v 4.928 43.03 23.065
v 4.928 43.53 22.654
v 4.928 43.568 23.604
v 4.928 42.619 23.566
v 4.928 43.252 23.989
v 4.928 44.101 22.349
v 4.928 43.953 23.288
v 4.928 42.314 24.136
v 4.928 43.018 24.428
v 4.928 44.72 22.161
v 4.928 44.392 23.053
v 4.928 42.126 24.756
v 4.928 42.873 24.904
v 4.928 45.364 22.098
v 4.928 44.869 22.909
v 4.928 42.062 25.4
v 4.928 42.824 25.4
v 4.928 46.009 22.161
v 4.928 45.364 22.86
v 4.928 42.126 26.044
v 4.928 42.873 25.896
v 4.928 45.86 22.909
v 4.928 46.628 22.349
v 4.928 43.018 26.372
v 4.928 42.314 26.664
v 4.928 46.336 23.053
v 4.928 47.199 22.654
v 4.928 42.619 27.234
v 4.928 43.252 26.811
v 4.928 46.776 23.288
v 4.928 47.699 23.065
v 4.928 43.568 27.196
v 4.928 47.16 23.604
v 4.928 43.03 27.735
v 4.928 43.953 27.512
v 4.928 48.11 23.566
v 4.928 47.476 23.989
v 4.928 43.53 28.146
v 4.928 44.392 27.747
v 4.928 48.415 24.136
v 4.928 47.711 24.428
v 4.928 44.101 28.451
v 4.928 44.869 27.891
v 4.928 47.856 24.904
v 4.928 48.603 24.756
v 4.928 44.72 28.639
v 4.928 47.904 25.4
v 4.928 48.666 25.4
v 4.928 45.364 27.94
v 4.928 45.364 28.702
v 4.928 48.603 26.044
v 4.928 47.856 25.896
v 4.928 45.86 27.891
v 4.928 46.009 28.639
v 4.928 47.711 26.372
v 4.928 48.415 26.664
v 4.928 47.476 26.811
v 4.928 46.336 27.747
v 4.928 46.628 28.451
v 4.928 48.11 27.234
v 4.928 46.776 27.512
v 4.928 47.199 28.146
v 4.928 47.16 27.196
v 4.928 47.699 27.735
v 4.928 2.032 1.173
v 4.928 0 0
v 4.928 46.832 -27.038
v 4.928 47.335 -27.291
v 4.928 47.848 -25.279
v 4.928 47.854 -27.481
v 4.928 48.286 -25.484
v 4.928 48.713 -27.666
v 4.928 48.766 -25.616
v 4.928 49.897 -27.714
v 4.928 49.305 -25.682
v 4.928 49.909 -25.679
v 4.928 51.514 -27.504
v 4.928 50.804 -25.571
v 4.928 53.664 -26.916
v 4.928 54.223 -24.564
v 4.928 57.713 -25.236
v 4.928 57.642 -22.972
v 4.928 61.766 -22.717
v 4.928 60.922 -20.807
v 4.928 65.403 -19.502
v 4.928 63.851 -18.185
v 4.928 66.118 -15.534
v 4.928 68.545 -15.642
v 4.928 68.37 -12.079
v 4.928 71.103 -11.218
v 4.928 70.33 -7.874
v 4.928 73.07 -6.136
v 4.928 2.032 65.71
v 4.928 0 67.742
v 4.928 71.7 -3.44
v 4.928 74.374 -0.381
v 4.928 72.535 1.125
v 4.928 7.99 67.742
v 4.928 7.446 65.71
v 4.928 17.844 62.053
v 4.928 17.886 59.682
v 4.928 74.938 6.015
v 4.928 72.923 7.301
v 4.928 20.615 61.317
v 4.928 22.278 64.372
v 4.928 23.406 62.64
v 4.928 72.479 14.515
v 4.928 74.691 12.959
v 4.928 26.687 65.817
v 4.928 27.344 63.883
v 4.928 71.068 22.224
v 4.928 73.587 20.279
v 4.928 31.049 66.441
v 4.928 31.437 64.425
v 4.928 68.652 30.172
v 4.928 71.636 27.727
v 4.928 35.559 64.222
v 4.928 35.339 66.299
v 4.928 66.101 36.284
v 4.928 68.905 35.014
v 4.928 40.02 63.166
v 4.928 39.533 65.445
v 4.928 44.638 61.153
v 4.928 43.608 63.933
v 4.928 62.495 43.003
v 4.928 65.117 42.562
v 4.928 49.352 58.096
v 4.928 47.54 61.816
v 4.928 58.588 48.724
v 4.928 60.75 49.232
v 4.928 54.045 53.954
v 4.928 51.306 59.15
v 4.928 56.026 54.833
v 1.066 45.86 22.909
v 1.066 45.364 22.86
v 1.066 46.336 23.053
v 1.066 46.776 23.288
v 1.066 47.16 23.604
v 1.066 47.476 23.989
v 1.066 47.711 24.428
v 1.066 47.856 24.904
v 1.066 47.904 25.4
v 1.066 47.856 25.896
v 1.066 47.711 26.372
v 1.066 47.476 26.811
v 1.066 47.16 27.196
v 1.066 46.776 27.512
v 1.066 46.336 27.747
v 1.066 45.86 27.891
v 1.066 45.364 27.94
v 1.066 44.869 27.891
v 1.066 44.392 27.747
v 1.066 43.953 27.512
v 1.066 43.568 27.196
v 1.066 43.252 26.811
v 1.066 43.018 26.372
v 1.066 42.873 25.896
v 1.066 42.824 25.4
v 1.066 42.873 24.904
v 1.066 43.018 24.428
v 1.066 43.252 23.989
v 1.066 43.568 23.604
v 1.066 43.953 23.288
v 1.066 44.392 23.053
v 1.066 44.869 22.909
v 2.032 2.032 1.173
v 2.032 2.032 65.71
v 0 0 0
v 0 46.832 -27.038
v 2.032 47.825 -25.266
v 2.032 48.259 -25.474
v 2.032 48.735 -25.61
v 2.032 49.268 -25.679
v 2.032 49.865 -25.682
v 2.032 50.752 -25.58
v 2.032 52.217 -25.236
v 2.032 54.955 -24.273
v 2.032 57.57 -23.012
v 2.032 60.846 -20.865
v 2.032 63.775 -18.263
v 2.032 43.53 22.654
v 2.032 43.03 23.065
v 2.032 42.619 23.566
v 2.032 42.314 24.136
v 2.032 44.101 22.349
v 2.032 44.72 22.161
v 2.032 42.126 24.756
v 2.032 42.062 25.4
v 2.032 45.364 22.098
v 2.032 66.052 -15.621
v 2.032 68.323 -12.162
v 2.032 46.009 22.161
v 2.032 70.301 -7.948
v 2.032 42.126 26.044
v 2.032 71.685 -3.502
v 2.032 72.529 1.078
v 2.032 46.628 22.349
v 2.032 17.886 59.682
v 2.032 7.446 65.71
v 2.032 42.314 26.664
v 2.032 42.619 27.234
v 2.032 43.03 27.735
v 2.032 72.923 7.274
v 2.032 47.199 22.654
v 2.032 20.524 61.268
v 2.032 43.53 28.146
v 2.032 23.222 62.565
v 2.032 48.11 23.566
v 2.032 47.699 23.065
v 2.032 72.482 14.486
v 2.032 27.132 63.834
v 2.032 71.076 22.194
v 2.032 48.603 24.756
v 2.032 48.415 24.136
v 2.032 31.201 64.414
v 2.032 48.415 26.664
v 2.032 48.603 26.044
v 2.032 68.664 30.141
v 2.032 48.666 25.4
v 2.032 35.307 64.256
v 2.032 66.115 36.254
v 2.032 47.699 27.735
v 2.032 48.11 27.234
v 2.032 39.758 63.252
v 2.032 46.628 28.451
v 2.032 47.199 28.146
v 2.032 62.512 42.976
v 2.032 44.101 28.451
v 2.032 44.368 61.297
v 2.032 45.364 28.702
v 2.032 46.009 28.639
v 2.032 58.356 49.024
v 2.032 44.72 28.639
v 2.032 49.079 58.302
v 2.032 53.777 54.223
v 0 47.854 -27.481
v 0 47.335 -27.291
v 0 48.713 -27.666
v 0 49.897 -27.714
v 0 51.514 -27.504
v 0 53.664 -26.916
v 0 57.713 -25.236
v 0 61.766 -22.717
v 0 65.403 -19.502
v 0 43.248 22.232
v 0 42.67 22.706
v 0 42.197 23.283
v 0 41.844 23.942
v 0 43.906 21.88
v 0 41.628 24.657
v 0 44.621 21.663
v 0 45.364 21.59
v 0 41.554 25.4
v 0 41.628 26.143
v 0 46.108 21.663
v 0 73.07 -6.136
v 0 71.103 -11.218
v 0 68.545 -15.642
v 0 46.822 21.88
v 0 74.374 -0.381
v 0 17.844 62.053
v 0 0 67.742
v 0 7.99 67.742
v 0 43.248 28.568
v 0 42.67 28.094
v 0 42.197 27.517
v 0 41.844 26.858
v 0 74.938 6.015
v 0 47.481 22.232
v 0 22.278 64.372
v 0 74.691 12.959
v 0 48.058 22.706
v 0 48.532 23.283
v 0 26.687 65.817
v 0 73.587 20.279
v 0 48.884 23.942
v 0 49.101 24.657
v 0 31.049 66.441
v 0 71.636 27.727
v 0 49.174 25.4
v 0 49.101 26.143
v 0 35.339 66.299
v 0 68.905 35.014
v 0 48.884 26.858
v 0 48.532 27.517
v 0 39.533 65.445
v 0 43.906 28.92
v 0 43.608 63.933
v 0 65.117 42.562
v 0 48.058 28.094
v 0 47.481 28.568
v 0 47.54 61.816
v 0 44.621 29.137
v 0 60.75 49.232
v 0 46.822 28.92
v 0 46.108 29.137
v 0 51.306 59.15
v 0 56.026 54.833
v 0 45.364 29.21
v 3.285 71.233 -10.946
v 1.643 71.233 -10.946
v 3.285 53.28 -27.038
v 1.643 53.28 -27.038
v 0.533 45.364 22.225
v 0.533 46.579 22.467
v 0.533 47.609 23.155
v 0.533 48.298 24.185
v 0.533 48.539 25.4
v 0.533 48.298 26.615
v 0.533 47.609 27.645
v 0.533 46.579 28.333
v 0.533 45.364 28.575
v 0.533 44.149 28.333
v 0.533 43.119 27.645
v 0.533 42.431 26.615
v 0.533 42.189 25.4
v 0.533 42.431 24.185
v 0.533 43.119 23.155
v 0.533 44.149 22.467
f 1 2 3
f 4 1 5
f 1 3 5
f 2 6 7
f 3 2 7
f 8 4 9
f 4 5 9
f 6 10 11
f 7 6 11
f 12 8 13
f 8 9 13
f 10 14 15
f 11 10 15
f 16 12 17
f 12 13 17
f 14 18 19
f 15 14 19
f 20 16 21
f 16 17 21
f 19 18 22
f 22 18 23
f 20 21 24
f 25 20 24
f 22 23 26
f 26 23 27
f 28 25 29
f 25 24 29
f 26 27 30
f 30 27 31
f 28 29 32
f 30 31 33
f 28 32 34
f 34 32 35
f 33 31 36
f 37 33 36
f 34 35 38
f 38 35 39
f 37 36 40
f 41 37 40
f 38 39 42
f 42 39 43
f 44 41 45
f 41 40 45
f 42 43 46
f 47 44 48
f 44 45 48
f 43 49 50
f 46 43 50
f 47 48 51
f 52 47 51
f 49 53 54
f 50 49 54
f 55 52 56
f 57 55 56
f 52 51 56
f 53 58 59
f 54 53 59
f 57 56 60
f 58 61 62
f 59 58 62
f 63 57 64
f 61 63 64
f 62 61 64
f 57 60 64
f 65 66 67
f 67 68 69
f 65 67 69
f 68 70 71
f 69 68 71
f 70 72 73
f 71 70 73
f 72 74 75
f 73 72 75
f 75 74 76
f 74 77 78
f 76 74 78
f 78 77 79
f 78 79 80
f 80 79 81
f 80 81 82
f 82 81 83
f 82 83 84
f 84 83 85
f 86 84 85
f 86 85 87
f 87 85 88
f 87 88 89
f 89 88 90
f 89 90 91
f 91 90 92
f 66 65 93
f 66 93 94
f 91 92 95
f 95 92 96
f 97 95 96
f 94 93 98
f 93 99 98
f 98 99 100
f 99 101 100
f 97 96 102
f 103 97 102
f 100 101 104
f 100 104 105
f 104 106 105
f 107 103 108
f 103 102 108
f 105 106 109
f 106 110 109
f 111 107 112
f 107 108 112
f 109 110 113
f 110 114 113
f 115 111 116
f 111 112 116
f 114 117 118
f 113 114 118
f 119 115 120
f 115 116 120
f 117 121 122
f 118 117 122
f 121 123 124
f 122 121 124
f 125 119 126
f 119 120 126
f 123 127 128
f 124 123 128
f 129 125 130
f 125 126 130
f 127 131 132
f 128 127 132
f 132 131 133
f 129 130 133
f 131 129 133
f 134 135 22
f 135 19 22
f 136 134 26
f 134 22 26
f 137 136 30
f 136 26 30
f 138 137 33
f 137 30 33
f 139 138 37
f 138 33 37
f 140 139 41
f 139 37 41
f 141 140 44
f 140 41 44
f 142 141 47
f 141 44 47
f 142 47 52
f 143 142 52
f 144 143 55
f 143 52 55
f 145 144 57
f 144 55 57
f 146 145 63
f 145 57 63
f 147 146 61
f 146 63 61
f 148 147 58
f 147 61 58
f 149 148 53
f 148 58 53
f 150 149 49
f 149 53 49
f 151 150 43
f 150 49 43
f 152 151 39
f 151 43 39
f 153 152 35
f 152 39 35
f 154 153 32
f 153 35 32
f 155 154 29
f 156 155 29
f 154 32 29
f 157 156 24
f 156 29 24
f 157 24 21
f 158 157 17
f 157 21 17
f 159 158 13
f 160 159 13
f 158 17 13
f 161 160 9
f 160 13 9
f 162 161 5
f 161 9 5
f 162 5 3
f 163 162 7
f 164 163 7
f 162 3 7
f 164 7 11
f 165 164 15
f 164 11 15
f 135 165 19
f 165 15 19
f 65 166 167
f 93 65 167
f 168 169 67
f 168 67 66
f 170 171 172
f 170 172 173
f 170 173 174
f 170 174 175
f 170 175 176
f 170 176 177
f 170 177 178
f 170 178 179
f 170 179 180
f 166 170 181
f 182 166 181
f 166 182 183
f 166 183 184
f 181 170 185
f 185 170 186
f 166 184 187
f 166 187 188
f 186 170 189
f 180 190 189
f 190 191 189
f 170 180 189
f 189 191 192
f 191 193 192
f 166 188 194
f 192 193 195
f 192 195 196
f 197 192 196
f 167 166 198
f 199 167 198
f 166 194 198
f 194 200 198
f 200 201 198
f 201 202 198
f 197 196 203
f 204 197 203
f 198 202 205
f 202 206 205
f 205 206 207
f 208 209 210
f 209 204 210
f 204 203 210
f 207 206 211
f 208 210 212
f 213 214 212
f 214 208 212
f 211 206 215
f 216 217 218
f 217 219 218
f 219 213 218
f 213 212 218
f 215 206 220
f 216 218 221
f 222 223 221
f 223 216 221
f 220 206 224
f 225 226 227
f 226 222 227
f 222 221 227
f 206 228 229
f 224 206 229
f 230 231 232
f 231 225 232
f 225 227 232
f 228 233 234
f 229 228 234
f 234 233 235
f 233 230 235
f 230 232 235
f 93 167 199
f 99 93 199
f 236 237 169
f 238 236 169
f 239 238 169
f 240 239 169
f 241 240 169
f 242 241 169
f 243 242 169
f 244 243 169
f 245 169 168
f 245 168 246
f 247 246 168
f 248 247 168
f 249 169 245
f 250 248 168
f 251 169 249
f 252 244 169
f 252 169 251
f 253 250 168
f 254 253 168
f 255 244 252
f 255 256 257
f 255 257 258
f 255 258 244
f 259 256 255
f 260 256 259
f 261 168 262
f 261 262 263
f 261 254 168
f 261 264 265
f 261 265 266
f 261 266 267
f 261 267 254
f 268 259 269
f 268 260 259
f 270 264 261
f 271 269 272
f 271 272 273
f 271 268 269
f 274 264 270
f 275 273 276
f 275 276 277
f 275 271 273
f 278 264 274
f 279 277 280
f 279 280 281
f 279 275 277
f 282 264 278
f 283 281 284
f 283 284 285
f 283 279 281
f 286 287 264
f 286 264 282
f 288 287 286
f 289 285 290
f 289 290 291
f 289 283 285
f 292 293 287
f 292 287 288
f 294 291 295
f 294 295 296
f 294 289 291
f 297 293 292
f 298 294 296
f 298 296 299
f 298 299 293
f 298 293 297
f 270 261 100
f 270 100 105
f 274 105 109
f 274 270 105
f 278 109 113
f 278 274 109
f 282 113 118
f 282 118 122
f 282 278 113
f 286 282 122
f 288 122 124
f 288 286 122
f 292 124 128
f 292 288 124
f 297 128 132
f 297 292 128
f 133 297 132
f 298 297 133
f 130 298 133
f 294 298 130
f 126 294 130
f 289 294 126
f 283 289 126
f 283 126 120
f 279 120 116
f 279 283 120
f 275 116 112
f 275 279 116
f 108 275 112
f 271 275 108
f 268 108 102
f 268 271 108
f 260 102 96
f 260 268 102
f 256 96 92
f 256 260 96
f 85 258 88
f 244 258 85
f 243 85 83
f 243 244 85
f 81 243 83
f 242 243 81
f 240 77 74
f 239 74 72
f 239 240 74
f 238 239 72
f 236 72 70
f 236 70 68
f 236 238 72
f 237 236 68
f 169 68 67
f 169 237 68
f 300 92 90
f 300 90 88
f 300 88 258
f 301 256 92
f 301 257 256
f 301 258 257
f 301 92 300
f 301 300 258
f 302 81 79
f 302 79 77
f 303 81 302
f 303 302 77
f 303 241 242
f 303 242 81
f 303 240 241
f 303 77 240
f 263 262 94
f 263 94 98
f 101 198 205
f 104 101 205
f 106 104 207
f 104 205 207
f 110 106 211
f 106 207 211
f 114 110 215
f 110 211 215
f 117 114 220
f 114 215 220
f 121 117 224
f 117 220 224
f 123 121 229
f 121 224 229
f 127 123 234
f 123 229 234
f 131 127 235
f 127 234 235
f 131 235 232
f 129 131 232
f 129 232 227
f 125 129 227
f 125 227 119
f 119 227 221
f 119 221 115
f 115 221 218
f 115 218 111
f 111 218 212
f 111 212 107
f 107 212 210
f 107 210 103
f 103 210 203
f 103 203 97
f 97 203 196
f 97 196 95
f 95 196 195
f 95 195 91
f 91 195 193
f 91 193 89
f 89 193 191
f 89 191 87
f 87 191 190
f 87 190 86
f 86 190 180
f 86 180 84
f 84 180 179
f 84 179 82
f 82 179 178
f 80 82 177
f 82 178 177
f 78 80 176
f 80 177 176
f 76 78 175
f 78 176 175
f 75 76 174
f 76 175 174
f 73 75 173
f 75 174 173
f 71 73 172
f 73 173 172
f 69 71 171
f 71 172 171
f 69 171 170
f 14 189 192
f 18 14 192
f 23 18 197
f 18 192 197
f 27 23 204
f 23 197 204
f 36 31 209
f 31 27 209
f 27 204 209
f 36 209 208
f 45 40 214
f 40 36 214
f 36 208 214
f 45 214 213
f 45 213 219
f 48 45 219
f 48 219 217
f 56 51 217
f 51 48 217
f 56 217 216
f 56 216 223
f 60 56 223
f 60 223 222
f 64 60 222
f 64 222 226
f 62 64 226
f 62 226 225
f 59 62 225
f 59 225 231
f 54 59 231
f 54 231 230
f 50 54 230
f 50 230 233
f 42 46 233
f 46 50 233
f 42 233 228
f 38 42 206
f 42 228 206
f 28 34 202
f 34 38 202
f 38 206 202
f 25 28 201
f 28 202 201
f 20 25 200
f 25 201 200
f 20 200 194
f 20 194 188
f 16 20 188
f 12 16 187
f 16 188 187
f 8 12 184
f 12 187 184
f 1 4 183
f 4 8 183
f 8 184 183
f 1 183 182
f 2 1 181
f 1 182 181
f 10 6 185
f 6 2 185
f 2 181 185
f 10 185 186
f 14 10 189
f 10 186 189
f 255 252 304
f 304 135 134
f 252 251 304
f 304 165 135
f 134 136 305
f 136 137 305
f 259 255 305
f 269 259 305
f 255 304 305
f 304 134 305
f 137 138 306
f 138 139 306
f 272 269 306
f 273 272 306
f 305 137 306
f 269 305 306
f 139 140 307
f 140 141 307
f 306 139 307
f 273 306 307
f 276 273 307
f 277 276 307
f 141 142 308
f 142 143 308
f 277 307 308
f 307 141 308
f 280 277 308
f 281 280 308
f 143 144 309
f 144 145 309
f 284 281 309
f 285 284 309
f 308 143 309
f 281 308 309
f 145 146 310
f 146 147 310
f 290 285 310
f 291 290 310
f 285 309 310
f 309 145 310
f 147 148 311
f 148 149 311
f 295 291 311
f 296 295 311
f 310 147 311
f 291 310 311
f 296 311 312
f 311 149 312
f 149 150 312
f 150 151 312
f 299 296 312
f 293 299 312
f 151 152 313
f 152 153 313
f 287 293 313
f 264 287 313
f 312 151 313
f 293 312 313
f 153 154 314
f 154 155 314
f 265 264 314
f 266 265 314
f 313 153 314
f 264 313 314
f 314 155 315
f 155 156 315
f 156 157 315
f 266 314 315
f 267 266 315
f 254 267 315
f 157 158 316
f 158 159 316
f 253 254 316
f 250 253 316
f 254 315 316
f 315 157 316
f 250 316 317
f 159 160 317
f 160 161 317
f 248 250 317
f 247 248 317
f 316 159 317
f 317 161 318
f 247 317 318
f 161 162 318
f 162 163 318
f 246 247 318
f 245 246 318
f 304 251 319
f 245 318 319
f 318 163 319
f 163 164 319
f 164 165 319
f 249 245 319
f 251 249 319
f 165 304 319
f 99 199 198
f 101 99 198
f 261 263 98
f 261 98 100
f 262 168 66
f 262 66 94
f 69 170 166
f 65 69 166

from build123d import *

# Parameters (mm, degrees)
SKETCH1_R                                         = 1.27
BOSS_EXTRUDE1_DEPTH                               = 4.9276
SHELL1_T                                          = -2.032
CSK_FOR_0_FLAT_HEAD_MACHINE_SCREW_100_D           = 5.08
CSK_FOR_0_FLAT_HEAD_MACHINE_SCREW_100_CSINK_D     = 7.62
CSK_FOR_0_FLAT_HEAD_MACHINE_SCREW_100_CSINK_ANGLE = 100


with BuildPart() as part:
    # Sketch1 → Boss-Extrude1 (new body)
    with BuildSketch(Plane(origin=(0, 0, 0), x_dir=(0, 0, -1), z_dir=(1, 0, 0))):
        with BuildLine():
            Line((0, 0), (-67.7418, 0))
            Line((-67.7418, 0), (-67.7418, 7.990379))
            Line((-67.7418, 7.990379), (-62.052733, 17.844133))
            add(Edge.make_bspline(
                [(-62.052733, 17.844133), (-83.520452, 52.181699), (-7.196896, 94.452135), (26.093729, 59.797721), (28.153169, 48.762718), (27.0383, 46.831709)],
                knots=[0, 0, 0, 0, 0.772335, 0.951961, 1, 1, 1, 1], degree=3))
            Line((27.0383, 46.831709), (0, 0))
        make_face()
        with Locations((-25.4, 45.3644)):
            Circle(SKETCH1_R, mode=Mode.SUBTRACT)
    extrude(amount=BOSS_EXTRUDE1_DEPTH)

    # Shell1
    shell1_openings = [part.faces().sort_by_distance(p)[0] for p in [
        (4.9276, 17.432002, 25.190503),
    ]]
    offset(amount=SHELL1_T, openings=shell1_openings, kind=Kind.INTERSECTION)

    # CSK for #0 Flat Head Machine Screw (100)2 (through all)
    with Locations(Plane.ZY):
        with Locations((25.4, 45.3644)):
            CounterSinkHole(CSK_FOR_0_FLAT_HEAD_MACHINE_SCREW_100_D / 2, CSK_FOR_0_FLAT_HEAD_MACHINE_SCREW_100_CSINK_D / 2, counter_sink_angle=CSK_FOR_0_FLAT_HEAD_MACHINE_SCREW_100_CSINK_ANGLE)


solid = part.part
